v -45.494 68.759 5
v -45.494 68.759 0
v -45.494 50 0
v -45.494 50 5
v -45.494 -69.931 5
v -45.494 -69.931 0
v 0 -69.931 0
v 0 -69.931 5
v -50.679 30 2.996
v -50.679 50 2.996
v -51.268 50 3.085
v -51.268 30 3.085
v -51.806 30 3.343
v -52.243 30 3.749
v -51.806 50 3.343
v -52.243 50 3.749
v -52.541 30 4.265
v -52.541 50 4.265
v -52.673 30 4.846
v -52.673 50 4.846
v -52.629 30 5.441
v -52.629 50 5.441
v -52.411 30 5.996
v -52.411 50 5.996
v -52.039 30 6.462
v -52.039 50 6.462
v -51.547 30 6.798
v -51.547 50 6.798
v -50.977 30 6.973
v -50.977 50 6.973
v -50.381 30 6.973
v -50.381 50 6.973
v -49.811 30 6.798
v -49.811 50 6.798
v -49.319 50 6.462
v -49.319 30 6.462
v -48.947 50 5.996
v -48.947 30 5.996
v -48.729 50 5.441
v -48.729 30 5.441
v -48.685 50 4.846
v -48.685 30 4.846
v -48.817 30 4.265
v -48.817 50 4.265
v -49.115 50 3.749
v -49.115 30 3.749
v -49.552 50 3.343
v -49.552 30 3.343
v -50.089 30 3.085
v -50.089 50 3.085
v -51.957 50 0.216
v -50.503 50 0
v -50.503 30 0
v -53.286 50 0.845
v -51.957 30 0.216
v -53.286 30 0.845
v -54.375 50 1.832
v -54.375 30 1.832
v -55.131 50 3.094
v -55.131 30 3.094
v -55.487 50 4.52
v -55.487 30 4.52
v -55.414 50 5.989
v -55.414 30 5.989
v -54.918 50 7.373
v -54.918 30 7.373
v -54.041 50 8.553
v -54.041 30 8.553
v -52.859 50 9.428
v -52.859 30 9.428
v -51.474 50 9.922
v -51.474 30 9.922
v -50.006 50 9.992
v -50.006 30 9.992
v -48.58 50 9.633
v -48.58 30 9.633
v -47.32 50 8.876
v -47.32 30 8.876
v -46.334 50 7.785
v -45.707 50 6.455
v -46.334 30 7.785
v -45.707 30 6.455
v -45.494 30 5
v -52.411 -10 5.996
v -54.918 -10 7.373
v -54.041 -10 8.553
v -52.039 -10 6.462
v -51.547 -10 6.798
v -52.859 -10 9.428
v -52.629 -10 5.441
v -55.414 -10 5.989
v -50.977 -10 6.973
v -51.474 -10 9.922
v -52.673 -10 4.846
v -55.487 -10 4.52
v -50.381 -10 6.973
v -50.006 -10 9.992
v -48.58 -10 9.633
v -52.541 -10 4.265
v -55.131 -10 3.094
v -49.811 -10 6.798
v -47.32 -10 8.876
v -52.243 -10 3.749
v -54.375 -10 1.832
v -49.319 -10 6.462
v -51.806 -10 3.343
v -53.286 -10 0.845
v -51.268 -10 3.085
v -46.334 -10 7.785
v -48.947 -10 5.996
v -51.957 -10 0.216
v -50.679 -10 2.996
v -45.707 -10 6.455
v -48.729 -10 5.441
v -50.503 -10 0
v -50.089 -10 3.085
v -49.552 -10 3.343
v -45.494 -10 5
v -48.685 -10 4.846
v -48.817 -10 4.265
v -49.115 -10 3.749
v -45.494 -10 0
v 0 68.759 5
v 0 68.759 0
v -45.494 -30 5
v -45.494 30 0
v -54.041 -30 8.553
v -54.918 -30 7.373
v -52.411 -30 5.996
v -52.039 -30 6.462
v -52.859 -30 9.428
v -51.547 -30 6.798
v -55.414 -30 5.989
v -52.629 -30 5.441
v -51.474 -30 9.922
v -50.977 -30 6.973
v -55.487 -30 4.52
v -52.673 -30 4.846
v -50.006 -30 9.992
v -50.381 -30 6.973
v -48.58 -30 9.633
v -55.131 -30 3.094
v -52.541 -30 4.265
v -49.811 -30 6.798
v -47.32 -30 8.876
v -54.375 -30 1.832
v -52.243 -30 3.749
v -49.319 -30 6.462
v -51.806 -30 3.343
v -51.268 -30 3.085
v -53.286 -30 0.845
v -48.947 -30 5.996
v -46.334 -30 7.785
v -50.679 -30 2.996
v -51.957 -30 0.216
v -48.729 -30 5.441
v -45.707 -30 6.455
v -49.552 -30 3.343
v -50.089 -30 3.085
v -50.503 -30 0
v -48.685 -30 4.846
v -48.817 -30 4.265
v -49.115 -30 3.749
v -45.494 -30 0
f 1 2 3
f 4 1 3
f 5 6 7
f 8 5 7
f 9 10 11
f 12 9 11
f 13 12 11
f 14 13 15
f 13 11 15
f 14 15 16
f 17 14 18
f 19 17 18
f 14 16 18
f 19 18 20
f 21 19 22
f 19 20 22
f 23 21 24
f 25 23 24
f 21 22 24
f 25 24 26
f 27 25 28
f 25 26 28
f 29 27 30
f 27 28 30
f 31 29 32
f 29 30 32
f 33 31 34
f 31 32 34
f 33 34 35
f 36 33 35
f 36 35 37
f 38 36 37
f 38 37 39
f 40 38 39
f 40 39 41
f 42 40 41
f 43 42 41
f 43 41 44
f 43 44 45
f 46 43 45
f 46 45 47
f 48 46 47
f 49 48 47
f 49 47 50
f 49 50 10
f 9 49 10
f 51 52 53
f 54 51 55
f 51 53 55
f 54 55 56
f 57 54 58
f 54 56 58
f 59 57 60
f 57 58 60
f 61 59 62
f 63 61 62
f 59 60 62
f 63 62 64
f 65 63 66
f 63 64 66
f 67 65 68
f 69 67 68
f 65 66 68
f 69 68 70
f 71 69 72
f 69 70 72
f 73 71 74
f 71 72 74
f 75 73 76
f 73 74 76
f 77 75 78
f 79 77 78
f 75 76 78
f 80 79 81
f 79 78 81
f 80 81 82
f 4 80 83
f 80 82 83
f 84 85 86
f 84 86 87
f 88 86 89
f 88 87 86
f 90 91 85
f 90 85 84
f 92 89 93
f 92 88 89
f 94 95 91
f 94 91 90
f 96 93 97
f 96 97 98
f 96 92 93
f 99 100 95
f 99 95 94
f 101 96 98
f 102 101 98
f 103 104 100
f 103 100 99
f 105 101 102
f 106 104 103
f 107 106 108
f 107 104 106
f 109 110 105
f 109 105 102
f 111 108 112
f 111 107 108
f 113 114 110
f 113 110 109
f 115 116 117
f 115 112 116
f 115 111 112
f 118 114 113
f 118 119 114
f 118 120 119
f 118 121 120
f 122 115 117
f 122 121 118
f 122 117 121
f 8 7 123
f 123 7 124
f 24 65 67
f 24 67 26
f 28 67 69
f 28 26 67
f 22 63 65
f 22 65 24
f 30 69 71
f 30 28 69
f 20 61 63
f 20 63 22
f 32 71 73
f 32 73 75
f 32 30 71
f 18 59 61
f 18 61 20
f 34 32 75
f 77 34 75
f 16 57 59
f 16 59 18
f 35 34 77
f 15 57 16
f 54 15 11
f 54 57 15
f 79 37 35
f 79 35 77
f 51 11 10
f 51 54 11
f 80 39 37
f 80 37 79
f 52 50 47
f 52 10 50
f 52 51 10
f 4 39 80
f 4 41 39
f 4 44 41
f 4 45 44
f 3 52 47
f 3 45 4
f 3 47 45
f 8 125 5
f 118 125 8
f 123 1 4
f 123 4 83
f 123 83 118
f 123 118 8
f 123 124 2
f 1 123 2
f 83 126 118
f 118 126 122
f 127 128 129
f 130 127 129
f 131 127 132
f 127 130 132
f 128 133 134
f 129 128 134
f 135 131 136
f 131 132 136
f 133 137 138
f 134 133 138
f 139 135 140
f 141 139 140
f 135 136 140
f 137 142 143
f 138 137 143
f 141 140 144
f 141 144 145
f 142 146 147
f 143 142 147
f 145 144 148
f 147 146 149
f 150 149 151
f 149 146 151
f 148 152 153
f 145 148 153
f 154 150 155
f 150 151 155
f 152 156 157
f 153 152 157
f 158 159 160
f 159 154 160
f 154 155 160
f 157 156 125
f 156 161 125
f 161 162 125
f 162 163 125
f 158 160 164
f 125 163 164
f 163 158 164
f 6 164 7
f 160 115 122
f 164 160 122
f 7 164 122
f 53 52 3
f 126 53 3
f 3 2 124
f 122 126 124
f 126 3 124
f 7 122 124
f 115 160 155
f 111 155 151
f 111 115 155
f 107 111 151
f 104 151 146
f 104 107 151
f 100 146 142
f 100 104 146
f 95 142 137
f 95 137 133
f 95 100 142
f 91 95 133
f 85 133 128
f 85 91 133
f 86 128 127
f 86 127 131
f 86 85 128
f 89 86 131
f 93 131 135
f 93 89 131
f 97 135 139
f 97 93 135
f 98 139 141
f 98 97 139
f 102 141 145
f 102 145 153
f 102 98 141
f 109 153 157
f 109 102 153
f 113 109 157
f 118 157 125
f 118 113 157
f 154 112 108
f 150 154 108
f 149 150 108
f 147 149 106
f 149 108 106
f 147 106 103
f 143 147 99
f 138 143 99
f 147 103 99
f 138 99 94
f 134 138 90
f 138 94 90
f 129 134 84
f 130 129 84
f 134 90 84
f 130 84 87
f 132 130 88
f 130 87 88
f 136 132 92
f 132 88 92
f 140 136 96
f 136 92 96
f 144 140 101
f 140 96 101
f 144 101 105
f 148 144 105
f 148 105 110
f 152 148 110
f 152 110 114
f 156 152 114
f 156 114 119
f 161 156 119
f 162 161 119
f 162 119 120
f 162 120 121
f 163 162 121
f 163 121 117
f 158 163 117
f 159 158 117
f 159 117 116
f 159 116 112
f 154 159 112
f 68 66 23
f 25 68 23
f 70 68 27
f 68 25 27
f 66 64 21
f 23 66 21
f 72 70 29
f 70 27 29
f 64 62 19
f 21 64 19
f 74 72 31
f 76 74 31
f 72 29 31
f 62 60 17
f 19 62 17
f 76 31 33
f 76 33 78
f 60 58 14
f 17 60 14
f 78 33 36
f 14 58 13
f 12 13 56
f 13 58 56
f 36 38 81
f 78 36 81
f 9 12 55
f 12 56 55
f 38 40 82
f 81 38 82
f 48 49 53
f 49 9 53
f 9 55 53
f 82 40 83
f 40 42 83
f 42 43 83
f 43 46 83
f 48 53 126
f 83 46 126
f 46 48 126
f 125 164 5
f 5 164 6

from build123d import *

# Parameters (mm, degrees)
EXTRUDE_1_DEPTH     = 5
EXTRUDE_2_DEPTH     = 20
SKETCH_4_R          = 2
CUT_EXTRUDE_1_DEPTH = 133.533705957


with BuildPart() as part:
    # 草图1 → 凸台-拉伸1 (new body)
    with BuildSketch(Plane.XY):
        Polygon((0, 0), (0, 68.759266336), (-45.494055631, 68.759266336), (-45.494055631, -69.930579597), (0, -69.930579597), align=None)
    extrude(amount=EXTRUDE_1_DEPTH)

    # 草图2 → 凸台-拉伸2 (add)
    with BuildSketch(Plane(origin=(0, 30, 0), x_dir=(1, 0, 0), z_dir=(0, 1, 0))):
        with BuildLine():
            Line((-45.494055631, 0), (-50.502634201, 0))
            ThreePointArc((-50.502634201, 0), (-54.041202389, -8.553225288), (-45.494055631, -5))
            Line((-45.494055631, -5), (-45.494055631, 0))
        make_face()
    extrude_2 = extrude(amount=EXTRUDE_2_DEPTH)

    # 镜向2: 凸台-拉伸2 across plane
    add(extrude_2.mirror(Plane.ZX.offset(10)))

    # 草图4 → 切除-拉伸1 (cut, through all)
    with BuildSketch(Plane(origin=(0, 50, 0), x_dir=(1, 0, 0), z_dir=(0, 1, 0))):
        with Locations(Location((-50.678910059, -4.995787087, 0), (0, 0, 90))):
            Circle(SKETCH_4_R)
    extrude(amount=-CUT_EXTRUDE_1_DEPTH, mode=Mode.SUBTRACT)


solid = part.part
